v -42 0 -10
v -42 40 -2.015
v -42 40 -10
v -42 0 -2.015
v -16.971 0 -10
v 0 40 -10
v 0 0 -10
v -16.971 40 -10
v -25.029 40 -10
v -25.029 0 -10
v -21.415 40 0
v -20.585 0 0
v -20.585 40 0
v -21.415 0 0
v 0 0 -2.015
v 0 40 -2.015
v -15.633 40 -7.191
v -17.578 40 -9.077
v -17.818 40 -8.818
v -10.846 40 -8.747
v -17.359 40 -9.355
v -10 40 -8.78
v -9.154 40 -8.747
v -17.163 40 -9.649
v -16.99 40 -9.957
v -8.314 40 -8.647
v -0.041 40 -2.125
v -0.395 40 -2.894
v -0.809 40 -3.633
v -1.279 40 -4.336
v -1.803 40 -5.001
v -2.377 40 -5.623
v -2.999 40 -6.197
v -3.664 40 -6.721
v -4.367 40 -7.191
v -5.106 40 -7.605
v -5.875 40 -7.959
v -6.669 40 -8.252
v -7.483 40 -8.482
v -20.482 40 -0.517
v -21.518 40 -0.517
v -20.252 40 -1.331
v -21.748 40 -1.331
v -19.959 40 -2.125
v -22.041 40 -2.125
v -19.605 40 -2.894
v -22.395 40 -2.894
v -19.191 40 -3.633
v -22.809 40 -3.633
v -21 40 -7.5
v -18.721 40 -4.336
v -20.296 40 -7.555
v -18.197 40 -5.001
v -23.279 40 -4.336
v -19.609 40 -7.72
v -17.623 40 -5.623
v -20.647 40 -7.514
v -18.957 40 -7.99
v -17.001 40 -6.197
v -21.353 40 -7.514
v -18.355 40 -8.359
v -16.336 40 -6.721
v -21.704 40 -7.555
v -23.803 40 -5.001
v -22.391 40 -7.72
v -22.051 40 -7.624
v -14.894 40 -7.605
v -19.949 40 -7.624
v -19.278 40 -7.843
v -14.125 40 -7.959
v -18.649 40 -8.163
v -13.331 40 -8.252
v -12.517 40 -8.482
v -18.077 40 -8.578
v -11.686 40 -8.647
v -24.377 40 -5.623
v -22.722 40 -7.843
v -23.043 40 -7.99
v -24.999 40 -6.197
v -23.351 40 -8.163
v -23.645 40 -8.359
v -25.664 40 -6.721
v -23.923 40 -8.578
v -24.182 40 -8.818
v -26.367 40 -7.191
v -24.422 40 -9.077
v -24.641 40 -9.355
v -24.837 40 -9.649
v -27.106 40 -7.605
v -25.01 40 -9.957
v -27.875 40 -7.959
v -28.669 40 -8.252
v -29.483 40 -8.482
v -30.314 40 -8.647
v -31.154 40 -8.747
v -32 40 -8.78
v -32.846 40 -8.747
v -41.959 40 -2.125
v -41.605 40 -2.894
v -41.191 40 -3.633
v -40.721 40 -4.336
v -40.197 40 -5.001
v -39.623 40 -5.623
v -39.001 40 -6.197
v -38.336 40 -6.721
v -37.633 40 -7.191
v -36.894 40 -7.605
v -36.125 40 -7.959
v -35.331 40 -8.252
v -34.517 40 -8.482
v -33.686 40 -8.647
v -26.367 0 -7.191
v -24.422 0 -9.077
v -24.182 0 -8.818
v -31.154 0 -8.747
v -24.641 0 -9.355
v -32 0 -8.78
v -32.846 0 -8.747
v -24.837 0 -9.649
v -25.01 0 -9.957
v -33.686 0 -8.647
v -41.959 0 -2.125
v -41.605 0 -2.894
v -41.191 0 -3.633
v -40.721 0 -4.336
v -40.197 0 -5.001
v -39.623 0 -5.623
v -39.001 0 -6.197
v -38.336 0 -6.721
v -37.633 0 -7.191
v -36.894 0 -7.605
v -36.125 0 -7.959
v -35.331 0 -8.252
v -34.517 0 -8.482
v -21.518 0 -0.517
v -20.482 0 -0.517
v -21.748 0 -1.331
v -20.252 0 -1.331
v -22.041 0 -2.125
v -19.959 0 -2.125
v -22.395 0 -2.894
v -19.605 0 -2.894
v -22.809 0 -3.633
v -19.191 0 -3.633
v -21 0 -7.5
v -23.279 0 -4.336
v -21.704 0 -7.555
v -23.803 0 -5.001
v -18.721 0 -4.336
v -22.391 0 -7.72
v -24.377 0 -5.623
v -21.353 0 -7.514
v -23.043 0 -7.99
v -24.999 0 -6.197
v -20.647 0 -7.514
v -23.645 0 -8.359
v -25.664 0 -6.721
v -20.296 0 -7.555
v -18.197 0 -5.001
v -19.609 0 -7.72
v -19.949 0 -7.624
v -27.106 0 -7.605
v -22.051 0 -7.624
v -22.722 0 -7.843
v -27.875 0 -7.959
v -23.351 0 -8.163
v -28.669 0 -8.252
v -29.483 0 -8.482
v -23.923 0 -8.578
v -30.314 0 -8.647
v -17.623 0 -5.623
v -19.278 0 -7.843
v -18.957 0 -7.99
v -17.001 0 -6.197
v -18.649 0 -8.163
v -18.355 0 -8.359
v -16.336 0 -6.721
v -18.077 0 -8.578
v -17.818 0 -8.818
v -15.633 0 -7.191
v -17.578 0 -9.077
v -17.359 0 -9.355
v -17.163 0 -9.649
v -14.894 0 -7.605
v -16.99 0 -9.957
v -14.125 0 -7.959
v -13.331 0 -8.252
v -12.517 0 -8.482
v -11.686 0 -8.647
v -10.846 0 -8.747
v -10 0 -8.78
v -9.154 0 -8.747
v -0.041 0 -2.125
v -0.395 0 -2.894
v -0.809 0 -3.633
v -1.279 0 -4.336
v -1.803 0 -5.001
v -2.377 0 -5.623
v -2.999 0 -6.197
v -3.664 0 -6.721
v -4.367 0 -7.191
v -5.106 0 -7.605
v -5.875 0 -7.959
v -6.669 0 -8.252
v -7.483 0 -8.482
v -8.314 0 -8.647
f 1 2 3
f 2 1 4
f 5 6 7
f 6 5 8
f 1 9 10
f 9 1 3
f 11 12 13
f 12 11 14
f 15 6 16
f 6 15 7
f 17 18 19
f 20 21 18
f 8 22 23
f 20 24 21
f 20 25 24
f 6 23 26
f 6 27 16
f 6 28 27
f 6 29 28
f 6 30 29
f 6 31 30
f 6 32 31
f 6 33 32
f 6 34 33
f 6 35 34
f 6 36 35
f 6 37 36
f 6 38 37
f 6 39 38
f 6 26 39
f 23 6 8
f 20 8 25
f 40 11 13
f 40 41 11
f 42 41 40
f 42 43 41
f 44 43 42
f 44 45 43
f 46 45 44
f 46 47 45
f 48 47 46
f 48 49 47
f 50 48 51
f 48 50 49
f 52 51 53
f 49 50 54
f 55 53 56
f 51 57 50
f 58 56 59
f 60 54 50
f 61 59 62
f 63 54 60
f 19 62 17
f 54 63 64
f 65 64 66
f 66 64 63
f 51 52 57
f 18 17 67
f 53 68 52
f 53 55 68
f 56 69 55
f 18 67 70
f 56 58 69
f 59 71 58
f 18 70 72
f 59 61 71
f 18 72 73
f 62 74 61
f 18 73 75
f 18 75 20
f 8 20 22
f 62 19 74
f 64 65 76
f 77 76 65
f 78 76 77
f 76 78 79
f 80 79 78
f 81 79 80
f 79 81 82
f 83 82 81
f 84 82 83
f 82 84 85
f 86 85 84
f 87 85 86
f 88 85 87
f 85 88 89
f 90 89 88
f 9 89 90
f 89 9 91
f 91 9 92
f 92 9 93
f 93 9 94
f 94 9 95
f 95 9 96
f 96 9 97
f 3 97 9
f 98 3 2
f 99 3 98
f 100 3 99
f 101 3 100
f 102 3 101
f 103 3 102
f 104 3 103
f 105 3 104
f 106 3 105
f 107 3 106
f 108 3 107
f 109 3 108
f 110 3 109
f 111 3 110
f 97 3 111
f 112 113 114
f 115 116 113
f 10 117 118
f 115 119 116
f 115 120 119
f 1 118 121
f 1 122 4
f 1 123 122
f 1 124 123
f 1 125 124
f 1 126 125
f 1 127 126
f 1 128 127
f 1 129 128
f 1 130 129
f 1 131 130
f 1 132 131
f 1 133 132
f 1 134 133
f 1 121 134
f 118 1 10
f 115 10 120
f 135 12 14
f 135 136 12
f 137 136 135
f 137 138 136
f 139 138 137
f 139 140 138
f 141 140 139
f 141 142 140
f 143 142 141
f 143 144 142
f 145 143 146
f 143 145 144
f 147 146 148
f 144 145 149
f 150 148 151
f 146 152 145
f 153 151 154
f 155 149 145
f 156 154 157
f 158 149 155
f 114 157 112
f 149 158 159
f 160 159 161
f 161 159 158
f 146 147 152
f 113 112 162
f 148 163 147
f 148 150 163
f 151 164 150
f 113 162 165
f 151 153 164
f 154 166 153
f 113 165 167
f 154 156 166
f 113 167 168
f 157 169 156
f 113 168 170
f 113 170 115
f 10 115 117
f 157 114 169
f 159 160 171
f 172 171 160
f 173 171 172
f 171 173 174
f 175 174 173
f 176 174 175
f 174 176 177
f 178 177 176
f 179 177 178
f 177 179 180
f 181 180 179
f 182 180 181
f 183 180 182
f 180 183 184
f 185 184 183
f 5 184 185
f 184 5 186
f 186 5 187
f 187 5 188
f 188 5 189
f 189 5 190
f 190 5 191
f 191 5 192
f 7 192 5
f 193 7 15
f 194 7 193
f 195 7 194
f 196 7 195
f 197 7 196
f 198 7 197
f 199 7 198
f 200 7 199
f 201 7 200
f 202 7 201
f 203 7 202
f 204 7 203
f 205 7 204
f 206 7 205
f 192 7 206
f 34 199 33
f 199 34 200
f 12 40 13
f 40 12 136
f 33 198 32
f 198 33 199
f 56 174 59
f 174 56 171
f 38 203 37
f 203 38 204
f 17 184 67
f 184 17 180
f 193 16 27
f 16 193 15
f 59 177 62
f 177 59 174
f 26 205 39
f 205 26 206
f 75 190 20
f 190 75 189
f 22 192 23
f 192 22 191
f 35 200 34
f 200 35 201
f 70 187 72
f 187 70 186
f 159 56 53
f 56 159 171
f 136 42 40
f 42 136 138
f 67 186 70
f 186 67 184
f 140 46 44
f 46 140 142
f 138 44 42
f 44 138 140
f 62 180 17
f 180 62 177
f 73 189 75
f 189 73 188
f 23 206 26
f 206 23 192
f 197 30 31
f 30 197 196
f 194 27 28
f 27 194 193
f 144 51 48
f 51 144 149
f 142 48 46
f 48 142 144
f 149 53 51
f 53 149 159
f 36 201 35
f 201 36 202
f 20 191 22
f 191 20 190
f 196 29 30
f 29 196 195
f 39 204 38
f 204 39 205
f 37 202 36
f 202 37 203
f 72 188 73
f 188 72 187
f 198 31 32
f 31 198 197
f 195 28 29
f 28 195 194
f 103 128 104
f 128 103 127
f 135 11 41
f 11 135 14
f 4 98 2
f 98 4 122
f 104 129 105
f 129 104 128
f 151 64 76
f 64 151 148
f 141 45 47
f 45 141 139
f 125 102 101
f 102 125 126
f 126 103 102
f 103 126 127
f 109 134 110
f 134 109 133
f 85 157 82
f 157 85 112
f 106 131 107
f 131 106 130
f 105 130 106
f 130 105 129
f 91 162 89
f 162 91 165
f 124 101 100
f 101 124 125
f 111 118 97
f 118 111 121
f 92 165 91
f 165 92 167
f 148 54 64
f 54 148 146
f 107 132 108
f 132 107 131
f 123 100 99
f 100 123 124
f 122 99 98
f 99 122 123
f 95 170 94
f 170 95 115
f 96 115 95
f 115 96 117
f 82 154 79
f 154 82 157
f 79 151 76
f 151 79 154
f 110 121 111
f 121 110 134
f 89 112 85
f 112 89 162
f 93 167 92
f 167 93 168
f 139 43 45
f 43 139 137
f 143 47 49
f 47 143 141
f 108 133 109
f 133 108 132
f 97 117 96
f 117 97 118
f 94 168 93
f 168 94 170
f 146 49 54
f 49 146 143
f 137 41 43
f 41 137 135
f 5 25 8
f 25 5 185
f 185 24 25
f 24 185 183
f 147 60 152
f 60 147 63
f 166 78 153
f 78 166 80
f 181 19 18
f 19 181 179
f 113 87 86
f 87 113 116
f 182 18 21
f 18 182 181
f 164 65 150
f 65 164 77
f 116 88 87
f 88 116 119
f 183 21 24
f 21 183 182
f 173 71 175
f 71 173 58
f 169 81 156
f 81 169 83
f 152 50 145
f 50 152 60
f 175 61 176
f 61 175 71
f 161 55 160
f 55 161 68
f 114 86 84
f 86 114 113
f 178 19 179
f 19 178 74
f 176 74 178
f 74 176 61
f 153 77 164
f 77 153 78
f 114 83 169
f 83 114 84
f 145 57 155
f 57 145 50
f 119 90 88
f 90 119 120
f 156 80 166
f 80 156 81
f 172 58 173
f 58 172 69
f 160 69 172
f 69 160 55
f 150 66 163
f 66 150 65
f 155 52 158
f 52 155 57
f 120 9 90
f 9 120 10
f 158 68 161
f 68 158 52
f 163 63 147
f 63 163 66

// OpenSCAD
$fn=80;
rotate([0,180,0]) {
difference() {
    cube([42,40,10]);
    translate([10,20,-2]) {
        rotate([90,0,0]) {
            cylinder(h=41, r=10.78, center=true);
        };
    };
    translate([32,20,-2]) {
        rotate([90,0,0]) {
            cylinder(h=41, r=10.78, center=true);
        };
    };
    translate([21,20,12]) {
        rotate([90,0,0]) {
            cylinder(h=41, r=4.5, center=true);
        };
    };
};
};
